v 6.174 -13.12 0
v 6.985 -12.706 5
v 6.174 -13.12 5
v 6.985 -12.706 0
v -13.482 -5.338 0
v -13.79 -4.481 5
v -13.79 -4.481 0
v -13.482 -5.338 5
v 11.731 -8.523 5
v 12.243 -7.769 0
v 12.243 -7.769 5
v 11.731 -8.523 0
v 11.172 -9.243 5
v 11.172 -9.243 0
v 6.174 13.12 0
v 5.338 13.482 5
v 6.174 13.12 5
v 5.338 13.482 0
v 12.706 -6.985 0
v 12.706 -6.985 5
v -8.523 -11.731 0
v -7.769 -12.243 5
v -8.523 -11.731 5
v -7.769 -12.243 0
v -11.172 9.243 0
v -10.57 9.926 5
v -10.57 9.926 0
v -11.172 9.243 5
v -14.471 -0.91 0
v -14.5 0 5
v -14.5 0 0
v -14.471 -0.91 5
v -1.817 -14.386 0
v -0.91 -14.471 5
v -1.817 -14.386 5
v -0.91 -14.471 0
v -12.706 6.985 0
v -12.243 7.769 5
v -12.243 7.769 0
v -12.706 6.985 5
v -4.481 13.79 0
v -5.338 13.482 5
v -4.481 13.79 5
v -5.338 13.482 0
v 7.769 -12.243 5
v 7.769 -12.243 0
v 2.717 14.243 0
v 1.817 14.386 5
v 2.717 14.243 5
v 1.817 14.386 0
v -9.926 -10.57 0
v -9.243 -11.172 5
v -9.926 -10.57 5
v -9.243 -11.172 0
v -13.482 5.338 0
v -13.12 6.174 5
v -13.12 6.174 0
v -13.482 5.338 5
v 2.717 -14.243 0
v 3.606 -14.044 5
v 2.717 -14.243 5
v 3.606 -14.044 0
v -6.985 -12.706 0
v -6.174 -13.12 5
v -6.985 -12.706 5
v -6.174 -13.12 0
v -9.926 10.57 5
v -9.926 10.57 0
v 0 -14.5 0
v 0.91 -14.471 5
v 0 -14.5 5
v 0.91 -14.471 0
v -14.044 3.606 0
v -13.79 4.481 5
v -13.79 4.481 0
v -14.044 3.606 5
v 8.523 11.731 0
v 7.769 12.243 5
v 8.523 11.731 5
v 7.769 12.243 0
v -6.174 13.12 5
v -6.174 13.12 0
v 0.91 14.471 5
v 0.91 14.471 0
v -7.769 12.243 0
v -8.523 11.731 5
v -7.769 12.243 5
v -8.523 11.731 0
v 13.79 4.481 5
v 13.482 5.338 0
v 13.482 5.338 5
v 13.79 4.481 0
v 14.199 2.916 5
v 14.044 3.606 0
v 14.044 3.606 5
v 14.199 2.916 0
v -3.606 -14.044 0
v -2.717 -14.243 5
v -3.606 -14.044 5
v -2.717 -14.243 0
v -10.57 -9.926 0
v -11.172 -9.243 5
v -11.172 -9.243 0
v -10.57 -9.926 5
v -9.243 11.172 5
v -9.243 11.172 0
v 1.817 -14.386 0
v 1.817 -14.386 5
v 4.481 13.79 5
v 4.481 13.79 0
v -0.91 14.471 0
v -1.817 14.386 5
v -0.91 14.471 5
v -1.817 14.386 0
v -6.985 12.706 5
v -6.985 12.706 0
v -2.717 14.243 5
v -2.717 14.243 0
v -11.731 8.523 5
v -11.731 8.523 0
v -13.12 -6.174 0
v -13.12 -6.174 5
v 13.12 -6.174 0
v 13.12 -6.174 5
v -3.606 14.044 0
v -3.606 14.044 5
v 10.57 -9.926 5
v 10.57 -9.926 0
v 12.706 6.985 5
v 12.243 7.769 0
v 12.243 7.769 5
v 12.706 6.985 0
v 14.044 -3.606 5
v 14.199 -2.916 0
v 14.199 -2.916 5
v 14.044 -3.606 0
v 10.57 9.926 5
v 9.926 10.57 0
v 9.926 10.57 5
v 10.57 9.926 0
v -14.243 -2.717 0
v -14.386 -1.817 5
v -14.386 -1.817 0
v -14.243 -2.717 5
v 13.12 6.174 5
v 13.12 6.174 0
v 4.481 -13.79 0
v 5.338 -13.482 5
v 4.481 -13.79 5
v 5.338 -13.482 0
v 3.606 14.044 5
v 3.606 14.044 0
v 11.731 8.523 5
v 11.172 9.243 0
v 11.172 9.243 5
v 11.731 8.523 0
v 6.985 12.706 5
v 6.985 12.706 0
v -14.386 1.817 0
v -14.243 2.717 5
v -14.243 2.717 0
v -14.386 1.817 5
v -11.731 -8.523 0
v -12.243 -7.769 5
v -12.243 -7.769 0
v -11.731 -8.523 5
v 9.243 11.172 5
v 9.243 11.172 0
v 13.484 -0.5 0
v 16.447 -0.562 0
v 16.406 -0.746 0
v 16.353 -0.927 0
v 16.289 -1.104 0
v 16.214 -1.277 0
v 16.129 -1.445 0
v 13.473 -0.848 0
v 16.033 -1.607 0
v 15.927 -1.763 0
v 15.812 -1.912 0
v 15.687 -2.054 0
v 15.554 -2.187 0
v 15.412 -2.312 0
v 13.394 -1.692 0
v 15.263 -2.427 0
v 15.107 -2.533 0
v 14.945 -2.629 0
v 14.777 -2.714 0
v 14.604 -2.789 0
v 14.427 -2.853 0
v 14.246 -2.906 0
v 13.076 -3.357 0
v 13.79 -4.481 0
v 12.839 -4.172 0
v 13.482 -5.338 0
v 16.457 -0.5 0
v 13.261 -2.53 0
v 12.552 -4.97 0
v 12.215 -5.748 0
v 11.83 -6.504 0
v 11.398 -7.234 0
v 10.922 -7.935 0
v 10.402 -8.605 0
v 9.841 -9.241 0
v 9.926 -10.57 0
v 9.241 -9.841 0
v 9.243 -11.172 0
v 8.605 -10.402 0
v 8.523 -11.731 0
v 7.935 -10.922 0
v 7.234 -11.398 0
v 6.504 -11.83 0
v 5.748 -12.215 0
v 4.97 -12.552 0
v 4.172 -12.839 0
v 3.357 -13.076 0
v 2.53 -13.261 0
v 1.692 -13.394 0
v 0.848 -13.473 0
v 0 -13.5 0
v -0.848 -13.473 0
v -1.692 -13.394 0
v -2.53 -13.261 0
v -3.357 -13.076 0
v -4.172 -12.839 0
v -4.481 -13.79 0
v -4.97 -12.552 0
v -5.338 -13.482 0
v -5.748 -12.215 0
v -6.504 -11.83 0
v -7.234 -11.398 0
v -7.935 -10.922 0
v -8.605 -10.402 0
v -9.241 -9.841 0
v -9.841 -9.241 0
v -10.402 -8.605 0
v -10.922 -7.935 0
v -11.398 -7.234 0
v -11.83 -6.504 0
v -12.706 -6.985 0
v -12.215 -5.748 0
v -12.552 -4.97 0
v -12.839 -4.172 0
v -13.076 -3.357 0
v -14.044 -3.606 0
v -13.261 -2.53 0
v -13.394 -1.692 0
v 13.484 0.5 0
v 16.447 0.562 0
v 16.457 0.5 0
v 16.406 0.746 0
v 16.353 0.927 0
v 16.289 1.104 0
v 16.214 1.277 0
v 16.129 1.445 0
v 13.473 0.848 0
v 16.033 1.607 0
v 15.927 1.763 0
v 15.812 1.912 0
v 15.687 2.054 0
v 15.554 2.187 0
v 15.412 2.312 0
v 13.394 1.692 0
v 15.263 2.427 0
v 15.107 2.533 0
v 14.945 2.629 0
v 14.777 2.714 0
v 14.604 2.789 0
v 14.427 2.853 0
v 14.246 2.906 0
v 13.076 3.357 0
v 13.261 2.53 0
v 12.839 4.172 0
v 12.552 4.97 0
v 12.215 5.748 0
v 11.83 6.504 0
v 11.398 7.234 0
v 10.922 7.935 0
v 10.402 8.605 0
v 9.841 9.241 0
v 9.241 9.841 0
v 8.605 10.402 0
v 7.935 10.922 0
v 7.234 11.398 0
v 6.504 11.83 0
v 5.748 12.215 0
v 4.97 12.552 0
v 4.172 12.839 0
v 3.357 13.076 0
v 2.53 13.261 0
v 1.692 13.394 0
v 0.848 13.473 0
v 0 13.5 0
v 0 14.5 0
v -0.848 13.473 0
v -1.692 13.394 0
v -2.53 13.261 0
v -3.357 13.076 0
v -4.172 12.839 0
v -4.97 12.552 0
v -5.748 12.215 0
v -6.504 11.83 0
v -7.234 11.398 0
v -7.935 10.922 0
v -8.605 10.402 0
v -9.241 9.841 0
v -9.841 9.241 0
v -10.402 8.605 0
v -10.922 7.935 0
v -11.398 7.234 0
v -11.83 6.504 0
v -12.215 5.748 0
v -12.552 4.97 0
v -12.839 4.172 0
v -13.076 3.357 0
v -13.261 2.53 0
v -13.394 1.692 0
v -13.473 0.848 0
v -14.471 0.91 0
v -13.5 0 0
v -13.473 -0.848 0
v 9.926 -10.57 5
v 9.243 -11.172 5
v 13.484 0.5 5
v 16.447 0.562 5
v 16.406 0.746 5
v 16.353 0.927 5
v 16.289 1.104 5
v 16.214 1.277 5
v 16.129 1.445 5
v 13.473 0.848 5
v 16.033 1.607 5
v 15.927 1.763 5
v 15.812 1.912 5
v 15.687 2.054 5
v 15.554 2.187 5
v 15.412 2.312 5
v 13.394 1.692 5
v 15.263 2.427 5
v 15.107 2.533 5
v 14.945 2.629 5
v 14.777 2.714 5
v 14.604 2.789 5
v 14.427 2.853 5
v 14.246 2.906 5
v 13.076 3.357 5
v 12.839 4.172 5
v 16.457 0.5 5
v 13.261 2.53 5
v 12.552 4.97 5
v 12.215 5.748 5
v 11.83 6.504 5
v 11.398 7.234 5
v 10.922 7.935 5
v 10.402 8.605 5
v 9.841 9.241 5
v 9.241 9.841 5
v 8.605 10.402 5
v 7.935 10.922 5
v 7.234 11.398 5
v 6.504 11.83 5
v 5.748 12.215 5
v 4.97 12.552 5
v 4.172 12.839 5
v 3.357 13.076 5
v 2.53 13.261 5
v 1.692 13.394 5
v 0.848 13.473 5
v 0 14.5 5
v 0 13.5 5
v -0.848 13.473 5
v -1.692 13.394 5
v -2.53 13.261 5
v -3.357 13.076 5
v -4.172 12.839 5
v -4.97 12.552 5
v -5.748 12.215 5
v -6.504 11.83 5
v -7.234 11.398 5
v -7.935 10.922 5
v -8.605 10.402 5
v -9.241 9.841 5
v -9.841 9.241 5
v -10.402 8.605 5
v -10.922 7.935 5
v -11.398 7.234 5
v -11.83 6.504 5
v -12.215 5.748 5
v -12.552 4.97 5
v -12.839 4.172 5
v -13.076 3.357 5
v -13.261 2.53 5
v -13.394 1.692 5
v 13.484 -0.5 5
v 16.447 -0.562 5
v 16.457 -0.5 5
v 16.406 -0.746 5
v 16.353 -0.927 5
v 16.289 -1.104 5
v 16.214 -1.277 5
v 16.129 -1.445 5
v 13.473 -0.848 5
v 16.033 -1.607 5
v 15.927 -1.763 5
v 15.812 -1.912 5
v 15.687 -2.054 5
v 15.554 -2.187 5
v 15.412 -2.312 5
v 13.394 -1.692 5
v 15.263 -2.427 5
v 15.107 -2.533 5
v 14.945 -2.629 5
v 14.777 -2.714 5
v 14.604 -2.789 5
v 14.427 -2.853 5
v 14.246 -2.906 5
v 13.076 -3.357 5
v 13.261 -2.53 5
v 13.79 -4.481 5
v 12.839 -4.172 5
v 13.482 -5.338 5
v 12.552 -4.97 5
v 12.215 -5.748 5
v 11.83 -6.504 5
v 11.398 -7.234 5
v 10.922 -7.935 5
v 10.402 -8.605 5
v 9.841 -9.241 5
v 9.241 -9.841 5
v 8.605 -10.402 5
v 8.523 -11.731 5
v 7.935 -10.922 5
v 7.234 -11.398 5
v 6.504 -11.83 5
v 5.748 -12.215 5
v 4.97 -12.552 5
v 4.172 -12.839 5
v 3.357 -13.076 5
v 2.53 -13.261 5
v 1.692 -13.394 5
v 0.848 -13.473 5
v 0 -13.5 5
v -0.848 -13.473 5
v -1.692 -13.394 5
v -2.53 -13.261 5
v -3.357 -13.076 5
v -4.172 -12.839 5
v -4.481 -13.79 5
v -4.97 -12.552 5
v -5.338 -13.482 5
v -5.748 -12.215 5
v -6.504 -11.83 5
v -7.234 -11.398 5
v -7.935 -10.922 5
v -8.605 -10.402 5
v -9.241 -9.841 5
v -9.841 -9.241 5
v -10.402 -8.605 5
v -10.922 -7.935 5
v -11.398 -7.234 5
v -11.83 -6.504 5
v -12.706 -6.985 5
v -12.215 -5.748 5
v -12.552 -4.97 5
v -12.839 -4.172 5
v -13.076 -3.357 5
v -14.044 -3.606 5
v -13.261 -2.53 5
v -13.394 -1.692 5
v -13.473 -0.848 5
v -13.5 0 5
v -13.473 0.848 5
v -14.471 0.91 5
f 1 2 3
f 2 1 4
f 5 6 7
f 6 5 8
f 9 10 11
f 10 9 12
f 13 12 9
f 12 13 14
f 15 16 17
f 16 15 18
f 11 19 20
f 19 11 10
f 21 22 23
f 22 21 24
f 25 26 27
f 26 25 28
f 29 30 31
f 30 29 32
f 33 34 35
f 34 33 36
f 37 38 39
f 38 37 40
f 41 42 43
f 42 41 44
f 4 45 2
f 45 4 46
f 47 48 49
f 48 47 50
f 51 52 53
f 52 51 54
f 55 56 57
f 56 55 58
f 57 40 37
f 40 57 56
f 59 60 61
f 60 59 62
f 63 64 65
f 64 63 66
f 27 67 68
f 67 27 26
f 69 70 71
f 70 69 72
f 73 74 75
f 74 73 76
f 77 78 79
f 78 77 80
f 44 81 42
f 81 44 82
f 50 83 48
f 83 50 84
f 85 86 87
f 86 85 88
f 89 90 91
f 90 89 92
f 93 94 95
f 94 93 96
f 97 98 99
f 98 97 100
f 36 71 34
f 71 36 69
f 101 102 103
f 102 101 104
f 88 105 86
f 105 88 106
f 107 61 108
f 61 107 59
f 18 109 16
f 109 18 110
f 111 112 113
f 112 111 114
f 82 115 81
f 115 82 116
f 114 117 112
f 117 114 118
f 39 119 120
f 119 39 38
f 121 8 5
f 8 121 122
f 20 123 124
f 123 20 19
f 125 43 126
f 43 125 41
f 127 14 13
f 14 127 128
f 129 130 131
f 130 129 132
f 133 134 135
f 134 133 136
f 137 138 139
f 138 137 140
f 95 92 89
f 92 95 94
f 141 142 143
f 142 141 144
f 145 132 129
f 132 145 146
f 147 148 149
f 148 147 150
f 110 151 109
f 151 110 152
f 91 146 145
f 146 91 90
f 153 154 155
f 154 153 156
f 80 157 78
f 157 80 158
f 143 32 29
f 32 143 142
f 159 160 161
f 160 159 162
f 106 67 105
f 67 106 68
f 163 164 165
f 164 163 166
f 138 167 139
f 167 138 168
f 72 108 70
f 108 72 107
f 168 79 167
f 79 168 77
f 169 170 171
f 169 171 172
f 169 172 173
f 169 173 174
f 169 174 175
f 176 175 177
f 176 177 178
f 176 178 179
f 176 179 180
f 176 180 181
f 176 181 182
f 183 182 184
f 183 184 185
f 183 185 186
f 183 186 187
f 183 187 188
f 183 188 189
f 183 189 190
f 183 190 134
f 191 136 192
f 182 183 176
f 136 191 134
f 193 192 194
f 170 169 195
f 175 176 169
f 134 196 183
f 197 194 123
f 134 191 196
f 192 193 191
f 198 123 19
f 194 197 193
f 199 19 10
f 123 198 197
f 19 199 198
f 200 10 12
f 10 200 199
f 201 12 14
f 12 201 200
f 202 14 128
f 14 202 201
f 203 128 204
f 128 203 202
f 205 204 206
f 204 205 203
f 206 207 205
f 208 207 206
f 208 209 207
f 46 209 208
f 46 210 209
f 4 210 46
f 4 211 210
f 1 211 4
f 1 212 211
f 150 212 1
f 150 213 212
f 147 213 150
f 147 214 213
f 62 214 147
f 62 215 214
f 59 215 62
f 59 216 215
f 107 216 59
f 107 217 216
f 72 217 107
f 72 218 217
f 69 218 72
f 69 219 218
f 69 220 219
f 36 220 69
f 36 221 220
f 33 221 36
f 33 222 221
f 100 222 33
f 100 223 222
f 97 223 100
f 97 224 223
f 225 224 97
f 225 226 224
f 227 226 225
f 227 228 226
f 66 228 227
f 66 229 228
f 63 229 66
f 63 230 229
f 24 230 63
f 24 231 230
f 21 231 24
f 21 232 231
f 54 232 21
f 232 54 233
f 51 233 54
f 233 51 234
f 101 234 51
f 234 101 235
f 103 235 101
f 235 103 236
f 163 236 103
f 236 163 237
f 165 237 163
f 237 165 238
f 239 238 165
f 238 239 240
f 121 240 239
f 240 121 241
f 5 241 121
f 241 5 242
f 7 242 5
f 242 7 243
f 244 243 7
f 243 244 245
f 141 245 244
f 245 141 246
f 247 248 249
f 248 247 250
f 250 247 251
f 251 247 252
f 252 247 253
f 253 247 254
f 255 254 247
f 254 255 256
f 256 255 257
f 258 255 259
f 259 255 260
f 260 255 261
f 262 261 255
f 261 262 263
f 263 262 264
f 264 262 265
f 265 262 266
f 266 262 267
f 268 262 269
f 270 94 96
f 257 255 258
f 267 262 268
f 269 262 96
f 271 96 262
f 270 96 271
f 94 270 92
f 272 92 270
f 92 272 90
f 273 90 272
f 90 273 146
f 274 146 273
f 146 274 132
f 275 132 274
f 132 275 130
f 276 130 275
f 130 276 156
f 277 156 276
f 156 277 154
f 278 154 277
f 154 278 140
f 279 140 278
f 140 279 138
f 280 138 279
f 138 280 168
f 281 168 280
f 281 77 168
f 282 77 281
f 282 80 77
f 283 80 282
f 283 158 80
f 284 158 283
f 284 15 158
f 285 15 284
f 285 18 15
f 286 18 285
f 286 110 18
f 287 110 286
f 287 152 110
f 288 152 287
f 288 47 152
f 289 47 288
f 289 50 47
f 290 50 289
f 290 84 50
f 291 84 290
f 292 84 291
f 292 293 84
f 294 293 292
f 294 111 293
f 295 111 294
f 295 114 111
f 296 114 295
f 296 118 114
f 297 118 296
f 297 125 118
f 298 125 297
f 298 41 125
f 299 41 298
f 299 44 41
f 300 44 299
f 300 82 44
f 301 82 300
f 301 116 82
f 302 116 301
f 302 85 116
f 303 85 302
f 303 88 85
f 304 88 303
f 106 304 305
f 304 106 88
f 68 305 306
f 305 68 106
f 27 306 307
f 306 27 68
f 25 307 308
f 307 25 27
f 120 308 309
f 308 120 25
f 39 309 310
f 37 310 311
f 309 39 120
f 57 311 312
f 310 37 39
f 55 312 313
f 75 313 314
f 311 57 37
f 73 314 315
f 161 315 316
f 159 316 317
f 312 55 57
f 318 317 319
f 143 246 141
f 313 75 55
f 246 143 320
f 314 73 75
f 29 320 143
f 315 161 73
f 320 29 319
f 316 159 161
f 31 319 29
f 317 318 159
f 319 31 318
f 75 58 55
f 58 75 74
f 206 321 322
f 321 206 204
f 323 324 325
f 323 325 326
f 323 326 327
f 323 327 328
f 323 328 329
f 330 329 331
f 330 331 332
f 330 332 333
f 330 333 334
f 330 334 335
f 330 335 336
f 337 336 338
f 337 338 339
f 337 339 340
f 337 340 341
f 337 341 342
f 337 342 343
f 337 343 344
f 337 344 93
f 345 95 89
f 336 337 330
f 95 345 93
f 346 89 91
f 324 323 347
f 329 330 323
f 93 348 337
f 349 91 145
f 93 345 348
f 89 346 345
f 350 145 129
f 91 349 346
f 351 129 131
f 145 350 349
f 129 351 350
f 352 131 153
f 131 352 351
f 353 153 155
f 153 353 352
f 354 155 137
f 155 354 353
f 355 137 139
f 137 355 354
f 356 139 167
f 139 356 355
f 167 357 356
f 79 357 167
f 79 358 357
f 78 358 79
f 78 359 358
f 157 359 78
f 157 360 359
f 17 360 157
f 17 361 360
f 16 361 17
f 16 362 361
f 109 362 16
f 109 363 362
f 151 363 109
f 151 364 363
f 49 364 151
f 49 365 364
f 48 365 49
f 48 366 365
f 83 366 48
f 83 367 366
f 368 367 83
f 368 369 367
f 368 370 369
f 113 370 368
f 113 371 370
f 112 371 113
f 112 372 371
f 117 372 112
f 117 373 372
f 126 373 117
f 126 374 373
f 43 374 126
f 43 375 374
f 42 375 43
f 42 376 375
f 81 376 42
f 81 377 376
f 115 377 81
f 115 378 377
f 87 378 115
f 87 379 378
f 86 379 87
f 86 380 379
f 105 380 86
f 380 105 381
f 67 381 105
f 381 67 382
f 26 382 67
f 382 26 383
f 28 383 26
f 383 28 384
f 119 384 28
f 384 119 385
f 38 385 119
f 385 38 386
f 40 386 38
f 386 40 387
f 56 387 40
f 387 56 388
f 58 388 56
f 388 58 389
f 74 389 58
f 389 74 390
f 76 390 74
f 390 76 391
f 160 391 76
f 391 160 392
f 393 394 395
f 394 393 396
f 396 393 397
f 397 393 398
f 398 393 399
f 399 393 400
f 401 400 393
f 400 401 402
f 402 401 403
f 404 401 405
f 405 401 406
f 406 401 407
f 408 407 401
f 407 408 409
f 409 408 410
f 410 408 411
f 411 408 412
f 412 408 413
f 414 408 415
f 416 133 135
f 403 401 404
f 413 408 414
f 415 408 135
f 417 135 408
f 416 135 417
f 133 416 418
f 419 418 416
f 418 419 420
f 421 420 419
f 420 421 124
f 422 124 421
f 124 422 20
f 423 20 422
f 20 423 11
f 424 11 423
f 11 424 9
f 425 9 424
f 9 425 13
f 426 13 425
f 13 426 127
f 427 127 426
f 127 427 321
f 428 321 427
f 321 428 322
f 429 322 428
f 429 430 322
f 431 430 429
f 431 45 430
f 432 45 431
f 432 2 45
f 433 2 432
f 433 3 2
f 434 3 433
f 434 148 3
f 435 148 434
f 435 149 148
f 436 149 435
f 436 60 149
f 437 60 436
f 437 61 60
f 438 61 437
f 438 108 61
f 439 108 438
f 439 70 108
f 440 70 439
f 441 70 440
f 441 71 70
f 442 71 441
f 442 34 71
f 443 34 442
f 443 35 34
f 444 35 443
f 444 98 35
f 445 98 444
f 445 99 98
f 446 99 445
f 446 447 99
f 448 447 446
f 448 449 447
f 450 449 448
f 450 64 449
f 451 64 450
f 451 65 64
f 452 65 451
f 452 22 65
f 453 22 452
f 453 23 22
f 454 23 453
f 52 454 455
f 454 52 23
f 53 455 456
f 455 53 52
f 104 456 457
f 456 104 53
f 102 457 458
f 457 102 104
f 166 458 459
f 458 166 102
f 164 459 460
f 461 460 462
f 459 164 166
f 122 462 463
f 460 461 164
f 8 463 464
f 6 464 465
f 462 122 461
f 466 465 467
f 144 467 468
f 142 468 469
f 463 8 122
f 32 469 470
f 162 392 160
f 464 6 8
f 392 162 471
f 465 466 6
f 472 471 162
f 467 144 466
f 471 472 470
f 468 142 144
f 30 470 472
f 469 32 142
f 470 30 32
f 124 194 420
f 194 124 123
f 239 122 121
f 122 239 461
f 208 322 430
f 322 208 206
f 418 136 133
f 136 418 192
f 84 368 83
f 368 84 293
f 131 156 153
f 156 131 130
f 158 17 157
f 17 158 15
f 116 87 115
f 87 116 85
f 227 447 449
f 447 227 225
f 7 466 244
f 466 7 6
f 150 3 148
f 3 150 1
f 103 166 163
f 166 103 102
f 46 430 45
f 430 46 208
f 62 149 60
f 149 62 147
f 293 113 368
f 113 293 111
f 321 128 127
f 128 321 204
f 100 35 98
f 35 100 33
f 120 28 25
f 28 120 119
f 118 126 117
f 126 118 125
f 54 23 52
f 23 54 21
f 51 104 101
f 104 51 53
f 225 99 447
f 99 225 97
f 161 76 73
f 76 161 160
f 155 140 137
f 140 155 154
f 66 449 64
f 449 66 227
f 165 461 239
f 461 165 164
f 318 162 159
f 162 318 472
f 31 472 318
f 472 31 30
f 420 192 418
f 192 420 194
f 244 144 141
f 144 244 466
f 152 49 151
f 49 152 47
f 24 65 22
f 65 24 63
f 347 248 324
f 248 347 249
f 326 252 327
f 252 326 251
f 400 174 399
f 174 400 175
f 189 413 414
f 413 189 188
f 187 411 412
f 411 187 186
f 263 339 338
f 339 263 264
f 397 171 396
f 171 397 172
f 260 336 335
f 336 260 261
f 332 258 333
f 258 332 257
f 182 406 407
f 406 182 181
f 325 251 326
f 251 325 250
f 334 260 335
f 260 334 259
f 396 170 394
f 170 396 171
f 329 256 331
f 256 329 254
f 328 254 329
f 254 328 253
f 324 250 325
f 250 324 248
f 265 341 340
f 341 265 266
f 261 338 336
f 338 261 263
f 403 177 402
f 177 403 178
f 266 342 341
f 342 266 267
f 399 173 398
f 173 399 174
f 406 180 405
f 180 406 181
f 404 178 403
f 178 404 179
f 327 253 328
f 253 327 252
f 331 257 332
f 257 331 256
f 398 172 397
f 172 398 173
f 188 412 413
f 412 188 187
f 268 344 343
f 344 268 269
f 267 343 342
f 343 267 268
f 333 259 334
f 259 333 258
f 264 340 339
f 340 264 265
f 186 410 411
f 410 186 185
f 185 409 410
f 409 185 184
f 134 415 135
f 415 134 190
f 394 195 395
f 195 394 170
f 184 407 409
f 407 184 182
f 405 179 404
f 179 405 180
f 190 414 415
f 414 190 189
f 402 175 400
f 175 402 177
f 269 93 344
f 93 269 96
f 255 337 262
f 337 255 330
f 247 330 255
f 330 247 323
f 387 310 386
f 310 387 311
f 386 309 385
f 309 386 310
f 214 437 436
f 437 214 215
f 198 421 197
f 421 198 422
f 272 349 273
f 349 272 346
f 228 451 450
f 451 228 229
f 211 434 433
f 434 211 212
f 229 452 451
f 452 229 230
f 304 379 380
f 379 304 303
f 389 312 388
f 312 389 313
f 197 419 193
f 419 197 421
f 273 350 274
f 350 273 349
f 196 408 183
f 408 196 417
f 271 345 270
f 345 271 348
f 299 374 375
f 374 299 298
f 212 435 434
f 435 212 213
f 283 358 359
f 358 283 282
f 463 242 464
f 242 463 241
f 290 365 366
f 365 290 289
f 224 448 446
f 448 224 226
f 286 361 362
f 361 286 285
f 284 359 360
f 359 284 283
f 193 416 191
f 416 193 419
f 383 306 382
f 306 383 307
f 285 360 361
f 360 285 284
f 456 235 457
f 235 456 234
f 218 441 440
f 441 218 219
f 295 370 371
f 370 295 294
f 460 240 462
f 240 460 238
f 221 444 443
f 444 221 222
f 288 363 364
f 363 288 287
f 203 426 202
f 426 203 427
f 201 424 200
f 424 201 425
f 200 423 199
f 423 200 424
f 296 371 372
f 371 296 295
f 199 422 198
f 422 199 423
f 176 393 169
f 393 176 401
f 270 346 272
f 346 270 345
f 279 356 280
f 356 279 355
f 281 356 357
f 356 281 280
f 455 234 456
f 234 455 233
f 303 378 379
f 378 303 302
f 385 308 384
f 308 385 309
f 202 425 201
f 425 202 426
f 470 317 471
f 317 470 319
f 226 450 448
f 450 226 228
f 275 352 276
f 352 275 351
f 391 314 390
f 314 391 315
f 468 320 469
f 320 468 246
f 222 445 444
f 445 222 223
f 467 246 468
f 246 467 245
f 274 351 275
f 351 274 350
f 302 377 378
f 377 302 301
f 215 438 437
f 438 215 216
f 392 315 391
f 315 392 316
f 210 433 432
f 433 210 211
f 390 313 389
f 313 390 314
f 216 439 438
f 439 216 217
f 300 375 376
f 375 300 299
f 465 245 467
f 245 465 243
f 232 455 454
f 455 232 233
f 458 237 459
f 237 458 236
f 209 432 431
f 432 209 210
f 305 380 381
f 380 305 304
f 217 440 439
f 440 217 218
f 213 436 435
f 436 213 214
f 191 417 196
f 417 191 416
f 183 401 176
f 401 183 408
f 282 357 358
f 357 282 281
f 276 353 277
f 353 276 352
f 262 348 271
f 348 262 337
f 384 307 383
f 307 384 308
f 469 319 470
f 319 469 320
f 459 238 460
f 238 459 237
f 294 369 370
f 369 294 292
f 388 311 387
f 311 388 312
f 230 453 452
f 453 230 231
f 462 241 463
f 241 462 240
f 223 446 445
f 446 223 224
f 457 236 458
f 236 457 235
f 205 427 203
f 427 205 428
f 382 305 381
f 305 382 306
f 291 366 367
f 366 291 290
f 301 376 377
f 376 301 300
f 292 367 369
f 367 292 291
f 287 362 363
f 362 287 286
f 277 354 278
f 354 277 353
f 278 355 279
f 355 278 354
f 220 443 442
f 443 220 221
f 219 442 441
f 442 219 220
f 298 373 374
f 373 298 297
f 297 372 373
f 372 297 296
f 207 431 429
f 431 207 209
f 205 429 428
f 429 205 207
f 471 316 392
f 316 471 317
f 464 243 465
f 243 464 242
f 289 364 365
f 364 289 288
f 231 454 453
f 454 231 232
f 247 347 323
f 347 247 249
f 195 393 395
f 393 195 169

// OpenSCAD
D = 27; // normally is 28 ; // mm 
D2 = D +2;
R = D/2;
H = 5;

$fn=100;

difference(){

union(){
cylinder(d=D2, h=H);

translate([R,0,0])
cylinder(d=6, h=H);
}

union(){
cylinder(d=D, h=H);

translate([0,-0.5,0])
cube([D2/2+5,1,H]);

}

}
